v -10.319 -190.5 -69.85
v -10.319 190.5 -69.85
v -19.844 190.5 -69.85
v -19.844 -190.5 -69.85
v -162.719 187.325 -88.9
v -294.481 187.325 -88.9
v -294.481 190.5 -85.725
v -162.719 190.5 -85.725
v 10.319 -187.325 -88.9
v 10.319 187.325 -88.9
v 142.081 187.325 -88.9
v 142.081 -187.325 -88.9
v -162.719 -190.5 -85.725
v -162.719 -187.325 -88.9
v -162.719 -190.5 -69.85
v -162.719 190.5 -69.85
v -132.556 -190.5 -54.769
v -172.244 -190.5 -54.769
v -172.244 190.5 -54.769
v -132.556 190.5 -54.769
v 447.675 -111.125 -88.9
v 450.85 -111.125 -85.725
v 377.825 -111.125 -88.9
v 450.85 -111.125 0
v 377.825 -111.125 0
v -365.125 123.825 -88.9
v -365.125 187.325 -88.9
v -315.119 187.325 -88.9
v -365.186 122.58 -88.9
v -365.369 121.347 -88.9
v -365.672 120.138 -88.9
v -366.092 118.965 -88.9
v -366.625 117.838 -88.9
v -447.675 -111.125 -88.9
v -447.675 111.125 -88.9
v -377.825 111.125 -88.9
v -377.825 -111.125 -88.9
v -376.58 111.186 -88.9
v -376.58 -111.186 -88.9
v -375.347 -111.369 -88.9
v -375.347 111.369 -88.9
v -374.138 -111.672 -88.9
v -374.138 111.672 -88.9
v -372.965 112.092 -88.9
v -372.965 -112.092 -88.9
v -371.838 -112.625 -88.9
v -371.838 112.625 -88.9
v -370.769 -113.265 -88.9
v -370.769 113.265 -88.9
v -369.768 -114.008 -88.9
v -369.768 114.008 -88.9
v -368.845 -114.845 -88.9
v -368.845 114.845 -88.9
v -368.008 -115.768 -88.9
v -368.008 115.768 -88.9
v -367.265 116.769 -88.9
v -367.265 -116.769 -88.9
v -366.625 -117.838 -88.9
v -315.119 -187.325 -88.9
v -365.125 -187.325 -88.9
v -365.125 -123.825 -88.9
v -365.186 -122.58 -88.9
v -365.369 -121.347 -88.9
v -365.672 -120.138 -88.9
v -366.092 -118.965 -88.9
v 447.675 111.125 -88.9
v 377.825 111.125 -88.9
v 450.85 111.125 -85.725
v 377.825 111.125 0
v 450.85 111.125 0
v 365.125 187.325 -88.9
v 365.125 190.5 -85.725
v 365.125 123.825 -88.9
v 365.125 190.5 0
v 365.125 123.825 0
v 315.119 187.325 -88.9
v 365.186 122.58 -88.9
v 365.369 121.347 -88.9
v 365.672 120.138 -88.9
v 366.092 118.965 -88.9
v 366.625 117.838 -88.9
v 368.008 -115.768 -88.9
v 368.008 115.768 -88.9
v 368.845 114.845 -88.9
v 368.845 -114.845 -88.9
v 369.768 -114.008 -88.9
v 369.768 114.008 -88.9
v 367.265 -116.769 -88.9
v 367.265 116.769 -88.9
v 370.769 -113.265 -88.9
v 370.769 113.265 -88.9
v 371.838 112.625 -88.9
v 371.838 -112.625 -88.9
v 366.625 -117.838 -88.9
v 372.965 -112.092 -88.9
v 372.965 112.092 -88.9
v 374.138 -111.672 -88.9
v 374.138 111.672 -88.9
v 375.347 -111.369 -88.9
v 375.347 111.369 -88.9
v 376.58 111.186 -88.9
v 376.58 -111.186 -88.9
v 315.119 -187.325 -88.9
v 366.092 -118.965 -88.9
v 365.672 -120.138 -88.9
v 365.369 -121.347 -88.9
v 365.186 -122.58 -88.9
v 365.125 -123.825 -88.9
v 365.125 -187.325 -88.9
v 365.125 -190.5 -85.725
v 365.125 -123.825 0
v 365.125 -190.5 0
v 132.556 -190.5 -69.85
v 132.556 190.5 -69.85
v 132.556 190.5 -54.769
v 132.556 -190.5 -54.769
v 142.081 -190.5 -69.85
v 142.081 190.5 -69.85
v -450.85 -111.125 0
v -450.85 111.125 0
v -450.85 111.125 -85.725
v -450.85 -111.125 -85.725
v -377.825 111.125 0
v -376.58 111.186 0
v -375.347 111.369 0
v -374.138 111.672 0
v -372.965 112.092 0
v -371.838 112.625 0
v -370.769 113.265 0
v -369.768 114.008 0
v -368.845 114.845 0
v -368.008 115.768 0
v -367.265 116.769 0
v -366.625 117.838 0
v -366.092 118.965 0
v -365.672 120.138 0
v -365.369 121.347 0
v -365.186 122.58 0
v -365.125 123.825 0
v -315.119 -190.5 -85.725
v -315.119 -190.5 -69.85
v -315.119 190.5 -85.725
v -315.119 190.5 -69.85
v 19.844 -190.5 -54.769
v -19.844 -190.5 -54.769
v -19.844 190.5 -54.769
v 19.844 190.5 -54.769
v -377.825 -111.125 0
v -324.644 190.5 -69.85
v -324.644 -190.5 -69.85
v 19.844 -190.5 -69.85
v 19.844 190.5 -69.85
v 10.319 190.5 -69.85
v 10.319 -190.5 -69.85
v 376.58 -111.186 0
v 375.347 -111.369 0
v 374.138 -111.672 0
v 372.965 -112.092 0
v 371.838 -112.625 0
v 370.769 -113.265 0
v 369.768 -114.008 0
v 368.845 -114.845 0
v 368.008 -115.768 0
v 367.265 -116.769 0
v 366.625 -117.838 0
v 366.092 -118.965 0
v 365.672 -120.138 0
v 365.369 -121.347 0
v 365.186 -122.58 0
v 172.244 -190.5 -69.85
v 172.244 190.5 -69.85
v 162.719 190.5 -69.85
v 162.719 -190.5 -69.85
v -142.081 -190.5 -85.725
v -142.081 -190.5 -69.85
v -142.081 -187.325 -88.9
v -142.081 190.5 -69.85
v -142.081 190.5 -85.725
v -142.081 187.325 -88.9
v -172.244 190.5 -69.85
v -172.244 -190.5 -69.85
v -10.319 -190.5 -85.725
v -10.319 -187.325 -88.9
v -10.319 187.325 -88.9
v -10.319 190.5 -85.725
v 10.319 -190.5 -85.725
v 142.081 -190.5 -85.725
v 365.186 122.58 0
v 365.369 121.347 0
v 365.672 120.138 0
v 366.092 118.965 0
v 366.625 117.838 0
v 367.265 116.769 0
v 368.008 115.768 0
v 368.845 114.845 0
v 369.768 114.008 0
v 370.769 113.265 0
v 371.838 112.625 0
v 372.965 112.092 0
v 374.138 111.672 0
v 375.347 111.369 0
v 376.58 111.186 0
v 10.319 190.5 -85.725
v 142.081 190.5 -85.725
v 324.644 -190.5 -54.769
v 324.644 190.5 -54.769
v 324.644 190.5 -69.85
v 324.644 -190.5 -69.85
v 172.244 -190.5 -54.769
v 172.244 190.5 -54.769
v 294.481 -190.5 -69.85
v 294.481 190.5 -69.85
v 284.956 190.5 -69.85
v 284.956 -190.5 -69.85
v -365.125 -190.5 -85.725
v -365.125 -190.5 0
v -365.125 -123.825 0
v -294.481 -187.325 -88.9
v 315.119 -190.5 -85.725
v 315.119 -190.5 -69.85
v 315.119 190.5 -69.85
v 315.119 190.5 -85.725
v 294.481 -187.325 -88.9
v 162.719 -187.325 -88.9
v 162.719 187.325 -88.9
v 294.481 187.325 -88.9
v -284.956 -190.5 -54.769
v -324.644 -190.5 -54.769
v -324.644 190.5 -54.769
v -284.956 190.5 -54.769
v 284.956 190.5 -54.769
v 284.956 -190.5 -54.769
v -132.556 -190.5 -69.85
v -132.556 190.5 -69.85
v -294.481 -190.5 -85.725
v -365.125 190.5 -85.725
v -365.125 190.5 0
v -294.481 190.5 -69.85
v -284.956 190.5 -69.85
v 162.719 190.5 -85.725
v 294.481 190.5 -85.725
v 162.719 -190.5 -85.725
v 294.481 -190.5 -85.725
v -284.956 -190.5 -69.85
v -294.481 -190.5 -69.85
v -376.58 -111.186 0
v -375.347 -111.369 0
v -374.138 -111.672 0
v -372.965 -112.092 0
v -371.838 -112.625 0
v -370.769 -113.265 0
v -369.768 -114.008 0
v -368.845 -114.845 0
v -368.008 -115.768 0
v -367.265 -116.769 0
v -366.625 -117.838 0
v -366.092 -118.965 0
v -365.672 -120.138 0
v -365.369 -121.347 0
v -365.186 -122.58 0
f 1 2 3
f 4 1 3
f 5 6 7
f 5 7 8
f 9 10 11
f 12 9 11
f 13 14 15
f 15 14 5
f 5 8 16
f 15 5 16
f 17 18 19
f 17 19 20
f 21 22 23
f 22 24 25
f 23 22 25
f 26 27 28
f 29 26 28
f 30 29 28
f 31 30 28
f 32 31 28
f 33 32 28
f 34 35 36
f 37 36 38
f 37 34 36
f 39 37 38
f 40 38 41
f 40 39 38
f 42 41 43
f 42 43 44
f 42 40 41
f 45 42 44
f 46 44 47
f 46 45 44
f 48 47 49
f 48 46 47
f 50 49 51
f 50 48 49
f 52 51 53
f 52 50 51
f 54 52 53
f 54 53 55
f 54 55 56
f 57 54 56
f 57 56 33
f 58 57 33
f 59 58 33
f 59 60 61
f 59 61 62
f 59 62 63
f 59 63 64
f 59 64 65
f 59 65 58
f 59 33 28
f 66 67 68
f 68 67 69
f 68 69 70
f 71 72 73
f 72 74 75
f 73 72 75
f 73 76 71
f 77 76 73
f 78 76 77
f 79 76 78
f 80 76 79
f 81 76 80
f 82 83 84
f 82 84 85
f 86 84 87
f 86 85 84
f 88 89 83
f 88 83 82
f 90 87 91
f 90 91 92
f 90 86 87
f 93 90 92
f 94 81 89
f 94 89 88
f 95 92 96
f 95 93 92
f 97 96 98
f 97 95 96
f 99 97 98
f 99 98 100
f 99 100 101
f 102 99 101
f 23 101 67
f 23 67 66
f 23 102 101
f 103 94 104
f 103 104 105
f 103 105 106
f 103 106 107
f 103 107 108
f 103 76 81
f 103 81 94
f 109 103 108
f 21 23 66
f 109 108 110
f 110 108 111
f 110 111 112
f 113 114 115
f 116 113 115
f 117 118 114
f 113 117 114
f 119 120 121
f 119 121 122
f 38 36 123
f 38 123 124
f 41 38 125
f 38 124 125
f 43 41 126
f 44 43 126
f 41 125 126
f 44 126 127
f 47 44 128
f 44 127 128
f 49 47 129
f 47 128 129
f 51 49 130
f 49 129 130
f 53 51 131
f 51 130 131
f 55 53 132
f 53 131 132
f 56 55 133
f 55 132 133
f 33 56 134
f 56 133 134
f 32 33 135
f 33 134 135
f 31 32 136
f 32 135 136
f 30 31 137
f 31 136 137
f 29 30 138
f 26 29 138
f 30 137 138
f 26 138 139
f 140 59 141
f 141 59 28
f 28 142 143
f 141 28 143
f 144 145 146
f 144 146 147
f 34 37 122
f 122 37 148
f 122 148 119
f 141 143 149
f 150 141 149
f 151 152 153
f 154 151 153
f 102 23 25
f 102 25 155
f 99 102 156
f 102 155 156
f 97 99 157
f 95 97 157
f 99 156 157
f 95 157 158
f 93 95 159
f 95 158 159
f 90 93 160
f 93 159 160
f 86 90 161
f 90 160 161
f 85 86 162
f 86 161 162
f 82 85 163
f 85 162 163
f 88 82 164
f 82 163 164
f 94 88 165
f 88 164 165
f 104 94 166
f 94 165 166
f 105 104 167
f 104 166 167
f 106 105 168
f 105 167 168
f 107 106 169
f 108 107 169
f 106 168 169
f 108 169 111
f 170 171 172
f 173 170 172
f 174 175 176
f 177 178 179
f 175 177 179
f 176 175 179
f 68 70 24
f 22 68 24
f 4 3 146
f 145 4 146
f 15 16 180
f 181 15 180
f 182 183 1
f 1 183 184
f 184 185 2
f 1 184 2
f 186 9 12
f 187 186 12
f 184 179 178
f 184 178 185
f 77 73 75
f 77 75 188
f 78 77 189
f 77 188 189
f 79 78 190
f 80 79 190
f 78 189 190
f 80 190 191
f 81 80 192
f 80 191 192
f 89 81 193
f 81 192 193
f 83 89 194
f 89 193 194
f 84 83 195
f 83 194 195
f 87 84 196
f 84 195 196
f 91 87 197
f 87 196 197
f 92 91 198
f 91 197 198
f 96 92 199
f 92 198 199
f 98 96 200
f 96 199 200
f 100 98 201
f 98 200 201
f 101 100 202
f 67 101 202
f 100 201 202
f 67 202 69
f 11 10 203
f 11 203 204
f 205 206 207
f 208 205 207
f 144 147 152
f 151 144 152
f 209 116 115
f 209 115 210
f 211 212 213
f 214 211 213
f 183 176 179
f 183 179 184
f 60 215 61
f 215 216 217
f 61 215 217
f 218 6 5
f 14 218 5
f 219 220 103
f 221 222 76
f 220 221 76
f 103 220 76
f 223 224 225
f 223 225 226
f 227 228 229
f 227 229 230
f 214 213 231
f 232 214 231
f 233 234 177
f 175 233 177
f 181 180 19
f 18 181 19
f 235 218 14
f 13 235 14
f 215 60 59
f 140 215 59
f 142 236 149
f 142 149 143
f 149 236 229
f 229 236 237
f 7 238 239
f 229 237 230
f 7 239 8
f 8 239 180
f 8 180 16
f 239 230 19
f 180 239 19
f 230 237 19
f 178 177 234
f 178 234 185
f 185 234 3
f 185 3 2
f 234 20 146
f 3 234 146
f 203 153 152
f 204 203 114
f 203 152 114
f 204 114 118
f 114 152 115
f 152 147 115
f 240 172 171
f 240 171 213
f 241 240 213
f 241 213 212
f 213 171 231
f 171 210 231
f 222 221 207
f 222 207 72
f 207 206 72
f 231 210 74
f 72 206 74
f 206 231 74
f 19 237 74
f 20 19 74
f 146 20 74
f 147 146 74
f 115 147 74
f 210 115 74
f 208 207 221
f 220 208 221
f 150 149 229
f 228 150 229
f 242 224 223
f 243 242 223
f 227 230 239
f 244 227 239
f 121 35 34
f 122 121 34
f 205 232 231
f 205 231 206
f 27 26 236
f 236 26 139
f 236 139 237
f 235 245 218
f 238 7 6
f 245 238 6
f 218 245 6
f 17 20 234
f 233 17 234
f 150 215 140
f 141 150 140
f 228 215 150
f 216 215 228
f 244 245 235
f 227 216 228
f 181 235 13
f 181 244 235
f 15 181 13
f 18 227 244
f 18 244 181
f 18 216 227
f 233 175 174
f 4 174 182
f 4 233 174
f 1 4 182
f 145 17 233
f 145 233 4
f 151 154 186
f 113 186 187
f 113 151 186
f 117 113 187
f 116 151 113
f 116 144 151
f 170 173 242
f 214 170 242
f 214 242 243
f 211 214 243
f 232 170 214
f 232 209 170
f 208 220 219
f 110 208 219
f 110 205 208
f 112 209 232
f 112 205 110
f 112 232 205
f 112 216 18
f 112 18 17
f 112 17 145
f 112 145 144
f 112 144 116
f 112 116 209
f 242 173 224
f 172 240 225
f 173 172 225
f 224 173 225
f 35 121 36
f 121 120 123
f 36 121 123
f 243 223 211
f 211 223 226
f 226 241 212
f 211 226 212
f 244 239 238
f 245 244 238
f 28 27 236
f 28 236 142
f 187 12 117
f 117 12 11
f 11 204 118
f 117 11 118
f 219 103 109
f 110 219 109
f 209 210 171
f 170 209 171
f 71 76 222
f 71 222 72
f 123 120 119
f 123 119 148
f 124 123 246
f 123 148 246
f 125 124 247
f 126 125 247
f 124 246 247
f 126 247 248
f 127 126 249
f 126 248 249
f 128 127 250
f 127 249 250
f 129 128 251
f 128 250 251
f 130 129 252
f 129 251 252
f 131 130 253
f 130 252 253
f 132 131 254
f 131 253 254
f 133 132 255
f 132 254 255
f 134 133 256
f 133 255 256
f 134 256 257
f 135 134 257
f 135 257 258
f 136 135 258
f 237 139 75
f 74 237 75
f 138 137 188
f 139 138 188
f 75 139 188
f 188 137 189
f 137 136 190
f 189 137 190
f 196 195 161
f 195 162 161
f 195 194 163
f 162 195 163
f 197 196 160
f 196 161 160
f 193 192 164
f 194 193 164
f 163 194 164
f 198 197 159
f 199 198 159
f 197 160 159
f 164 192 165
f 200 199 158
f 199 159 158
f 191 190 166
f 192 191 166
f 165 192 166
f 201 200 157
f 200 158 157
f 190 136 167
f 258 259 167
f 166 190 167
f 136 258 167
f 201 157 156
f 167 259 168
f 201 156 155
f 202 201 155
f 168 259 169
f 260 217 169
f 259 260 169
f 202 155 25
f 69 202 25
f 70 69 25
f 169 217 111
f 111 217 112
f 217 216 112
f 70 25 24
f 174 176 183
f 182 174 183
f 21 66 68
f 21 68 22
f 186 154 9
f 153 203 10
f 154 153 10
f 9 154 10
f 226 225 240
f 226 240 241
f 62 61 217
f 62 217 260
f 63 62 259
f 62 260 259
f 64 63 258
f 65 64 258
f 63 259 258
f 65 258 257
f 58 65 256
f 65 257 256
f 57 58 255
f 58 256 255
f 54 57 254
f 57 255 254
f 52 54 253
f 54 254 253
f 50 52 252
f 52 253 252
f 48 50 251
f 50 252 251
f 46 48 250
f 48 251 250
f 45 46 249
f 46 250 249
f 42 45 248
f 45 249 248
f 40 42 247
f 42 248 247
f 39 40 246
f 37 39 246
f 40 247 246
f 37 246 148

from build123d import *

# Parameters (mm, degrees)
F0_W     = 901.7
F0_H     = 381
F1_DEPTH = 88.9
F2_SIZE  = 3.175
F4_DEPTH = 381.001
F6_DEPTH = 88.901
F8_ANGLE = 180


with BuildPart() as f1:
    # F0 (on Top) → F1 (new body)
    with BuildSketch(Plane.XY):
        Rectangle(F0_W, F0_H)
    extrude(amount=F1_DEPTH)

    # F2
    f2_edges = [f1.edges().sort_by_distance(p)[0] for p in [
        (0, -190.5, 88.9),
        (450.85, 0, 88.9),
        (0, 190.5, 88.9),
        (-450.85, 0, 88.9),
    ]]
    chamfer(f2_edges, length=F2_SIZE)

    # F3 (on face) → F4 (cut, through all)
    with BuildSketch(Plane.XZ.offset(190.5)):
        Polygon((315.11875, 88.9), (294.48125, 88.9), (294.48125, 69.85), (284.95625, 69.85), (284.95625, 54.76875), (324.64375, 54.76875), (324.64375, 69.85), (315.11875, 69.85), align=None)
        Polygon((162.71875, 88.9), (142.08125, 88.9), (142.08125, 69.85), (132.55625, 69.85), (132.55625, 54.76875), (172.24375, 54.76875), (172.24375, 69.85), (162.71875, 69.85), align=None)
        Polygon((10.31875, 88.9), (-10.31875, 88.9), (-10.31875, 69.85), (-19.84375, 69.85), (-19.84375, 54.76875), (19.84375, 54.76875), (19.84375, 69.85), (10.31875, 69.85), align=None)
        Polygon((-142.08125, 88.9), (-162.71875, 88.9), (-162.71875, 69.85), (-172.24375, 69.85), (-172.24375, 54.76875), (-132.55625, 54.76875), (-132.55625, 69.85), (-142.08125, 69.85), align=None)
        Polygon((-294.48125, 88.9), (-315.11875, 88.9), (-315.11875, 69.85), (-324.64375, 69.85), (-324.64375, 54.76875), (-284.95625, 54.76875), (-284.95625, 69.85), (-294.48125, 69.85), align=None)
    extrude(amount=-F4_DEPTH, mode=Mode.SUBTRACT)

    # F5 (on face) → F6 (cut, through all)
    with BuildSketch(Plane(origin=(0, 0, 0), x_dir=(1, 0, 0), z_dir=(0, 0, -1))):
        with BuildLine():
            Line((-450.85, -190.5), (-365.125, -190.5))
            Line((-365.125, -190.5), (-365.125, -123.825))
            ThreePointArc((-365.125, -123.825), (-368.844744, -114.844744), (-377.825, -111.125))
            Line((-377.825, -111.125), (-450.85, -111.125))
            Line((-450.85, -111.125), (-450.85, -190.5))
        make_face()
        with BuildLine():
            ThreePointArc((377.825, -111.125), (368.844744, -114.844744), (365.125, -123.825))
            Line((365.125, -123.825), (365.125, -190.5))
            Line((365.125, -190.5), (450.85, -190.5))
            Line((450.85, -190.5), (450.85, -111.125))
            Line((450.85, -111.125), (377.825, -111.125))
        make_face()
        with BuildLine():
            Line((365.125, 190.5), (365.125, 123.825))
            ThreePointArc((365.125, 123.825), (368.844744, 114.844744), (377.825, 111.125))
            Line((377.825, 111.125), (450.85, 111.125))
            Line((450.85, 111.125), (450.85, 190.5))
            Line((450.85, 190.5), (365.125, 190.5))
        make_face()
        with BuildLine():
            ThreePointArc((-377.825, 111.125), (-368.844744, 114.844744), (-365.125, 123.825))
            Line((-365.125, 123.825), (-365.125, 190.5))
            Line((-365.125, 190.5), (-450.85, 190.5))
            Line((-450.85, 190.5), (-450.85, 111.125))
            Line((-450.85, 111.125), (-377.825, 111.125))
        make_face()
    extrude(amount=-F6_DEPTH, mode=Mode.SUBTRACT)


with BuildPart() as f1_1:
    # F8: moved
    add(f1.part.rotate(Axis((1.057014, 0, 0), (1, 0, 0)), F8_ANGLE))


solid = f1_1.part
